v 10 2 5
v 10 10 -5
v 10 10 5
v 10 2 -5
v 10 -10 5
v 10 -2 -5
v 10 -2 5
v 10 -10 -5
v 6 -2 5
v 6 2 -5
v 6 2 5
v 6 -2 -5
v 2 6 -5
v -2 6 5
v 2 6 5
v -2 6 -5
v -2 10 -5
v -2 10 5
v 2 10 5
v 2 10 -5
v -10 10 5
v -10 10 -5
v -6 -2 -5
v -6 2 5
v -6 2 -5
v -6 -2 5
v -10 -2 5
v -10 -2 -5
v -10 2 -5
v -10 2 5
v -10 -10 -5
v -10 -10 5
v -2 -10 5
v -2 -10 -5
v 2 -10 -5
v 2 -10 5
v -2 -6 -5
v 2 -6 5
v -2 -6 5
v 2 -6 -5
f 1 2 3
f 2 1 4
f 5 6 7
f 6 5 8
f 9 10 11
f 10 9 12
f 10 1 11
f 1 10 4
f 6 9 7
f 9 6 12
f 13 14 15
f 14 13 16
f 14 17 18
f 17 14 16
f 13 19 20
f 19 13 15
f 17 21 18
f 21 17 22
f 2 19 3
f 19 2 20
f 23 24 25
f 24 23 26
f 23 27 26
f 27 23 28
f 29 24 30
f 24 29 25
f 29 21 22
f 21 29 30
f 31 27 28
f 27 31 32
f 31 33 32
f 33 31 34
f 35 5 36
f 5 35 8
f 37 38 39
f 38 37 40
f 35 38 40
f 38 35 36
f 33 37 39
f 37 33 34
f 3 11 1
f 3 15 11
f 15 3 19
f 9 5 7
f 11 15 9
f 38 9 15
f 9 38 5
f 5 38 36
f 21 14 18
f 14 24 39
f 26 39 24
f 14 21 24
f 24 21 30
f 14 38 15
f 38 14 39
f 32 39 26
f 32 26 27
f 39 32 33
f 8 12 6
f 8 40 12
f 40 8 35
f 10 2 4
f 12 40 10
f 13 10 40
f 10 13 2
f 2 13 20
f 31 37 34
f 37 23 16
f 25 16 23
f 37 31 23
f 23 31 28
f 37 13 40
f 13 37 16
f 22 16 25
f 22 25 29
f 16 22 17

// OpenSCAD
// Test that [0:90:270] produces exactly 4 iterations (step-based for loop)
// Boxes are subtracted from a box so the result is a single connected solid.
$fn=10;

difference() {
    cube([20, 20, 10], center=true);
    for (angle = [0:90:270]) {
        rotate([0, 0, angle])
        translate([8, 0, 0])
        cube([4, 4, 14], center=true);
    }
}
